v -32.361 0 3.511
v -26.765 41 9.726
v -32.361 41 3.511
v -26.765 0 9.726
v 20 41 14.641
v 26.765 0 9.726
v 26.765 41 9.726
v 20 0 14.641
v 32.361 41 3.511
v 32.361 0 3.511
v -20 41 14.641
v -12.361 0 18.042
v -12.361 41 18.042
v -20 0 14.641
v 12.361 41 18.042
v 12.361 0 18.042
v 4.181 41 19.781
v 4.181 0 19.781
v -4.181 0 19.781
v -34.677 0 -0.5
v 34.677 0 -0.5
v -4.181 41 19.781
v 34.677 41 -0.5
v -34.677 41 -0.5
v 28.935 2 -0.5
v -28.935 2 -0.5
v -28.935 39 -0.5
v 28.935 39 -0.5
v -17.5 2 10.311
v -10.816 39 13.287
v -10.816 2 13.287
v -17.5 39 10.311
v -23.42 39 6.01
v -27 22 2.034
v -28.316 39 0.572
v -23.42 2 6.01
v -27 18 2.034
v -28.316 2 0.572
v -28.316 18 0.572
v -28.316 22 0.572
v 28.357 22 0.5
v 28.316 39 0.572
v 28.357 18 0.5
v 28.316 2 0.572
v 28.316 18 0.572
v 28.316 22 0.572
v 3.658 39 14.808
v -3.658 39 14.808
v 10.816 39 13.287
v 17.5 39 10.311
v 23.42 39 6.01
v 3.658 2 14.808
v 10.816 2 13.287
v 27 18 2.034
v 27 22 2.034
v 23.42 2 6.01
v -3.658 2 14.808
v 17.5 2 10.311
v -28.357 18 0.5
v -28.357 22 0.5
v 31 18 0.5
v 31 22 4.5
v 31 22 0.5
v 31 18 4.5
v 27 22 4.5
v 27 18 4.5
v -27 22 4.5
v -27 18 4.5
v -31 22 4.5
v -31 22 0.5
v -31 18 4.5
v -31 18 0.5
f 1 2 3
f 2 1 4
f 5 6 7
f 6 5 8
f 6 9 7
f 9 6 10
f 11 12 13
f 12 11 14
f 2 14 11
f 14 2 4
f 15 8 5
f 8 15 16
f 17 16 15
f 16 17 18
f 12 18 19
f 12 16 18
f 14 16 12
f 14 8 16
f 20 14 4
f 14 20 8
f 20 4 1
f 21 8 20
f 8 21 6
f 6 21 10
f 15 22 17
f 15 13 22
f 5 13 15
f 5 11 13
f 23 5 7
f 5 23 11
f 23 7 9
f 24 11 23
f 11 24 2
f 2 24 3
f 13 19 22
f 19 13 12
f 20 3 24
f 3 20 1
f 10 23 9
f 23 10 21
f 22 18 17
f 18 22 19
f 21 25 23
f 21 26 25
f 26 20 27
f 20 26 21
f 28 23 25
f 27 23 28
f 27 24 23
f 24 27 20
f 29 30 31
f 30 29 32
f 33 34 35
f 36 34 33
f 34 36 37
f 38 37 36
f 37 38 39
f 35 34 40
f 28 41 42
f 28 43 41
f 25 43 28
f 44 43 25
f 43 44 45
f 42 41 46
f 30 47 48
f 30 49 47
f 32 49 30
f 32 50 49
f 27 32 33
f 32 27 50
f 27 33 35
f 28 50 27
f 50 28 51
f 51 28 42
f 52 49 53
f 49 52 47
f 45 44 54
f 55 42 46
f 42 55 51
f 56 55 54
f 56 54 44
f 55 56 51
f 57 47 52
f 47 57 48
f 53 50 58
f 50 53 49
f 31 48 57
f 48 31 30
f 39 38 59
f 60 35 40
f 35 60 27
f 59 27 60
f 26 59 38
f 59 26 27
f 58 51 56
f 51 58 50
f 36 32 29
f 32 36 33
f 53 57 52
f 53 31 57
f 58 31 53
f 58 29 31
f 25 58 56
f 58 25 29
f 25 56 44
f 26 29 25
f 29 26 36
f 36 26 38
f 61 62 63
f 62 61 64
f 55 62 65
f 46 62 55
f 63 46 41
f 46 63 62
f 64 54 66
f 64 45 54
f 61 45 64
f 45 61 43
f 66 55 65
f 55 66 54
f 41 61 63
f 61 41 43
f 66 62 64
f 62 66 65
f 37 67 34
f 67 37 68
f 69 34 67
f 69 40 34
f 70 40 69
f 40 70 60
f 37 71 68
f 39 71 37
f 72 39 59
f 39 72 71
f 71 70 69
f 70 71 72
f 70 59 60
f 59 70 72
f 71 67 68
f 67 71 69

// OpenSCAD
/*
    TOS Version 2 Top
    

*/
rotate(a=[270,0,0]) {
    translate([0,20, 0]) {
        difference() {
            // Main Body Outside
            difference() {
                cylinder(h=41, r=40);
                translate([0,30,0]) {
                    cube(99, center=true);
                }
                
            };

            // Main Body Inside
            difference() {
          
                translate([0,0,2]) {
                    cylinder(h=37, r=35);
                };        
                translate([0,30,0]) {
                    cube(99, center=true);
                }

            };
            
            // Inside Recesses
            // Front and back
             translate([29,-22.5,20]) {
                cube(4, center=true);
            }
            
            translate([-29,-22.5,20]) {
                cube(4, center=true);
            }
          /*  
            // Left and right
            translate([0,-23,37]) {
                cube(4, center=true);
            }
                
            translate([0,-23,4]) {
                cube(4, center=true);
            }
            */
        }
    }
}
